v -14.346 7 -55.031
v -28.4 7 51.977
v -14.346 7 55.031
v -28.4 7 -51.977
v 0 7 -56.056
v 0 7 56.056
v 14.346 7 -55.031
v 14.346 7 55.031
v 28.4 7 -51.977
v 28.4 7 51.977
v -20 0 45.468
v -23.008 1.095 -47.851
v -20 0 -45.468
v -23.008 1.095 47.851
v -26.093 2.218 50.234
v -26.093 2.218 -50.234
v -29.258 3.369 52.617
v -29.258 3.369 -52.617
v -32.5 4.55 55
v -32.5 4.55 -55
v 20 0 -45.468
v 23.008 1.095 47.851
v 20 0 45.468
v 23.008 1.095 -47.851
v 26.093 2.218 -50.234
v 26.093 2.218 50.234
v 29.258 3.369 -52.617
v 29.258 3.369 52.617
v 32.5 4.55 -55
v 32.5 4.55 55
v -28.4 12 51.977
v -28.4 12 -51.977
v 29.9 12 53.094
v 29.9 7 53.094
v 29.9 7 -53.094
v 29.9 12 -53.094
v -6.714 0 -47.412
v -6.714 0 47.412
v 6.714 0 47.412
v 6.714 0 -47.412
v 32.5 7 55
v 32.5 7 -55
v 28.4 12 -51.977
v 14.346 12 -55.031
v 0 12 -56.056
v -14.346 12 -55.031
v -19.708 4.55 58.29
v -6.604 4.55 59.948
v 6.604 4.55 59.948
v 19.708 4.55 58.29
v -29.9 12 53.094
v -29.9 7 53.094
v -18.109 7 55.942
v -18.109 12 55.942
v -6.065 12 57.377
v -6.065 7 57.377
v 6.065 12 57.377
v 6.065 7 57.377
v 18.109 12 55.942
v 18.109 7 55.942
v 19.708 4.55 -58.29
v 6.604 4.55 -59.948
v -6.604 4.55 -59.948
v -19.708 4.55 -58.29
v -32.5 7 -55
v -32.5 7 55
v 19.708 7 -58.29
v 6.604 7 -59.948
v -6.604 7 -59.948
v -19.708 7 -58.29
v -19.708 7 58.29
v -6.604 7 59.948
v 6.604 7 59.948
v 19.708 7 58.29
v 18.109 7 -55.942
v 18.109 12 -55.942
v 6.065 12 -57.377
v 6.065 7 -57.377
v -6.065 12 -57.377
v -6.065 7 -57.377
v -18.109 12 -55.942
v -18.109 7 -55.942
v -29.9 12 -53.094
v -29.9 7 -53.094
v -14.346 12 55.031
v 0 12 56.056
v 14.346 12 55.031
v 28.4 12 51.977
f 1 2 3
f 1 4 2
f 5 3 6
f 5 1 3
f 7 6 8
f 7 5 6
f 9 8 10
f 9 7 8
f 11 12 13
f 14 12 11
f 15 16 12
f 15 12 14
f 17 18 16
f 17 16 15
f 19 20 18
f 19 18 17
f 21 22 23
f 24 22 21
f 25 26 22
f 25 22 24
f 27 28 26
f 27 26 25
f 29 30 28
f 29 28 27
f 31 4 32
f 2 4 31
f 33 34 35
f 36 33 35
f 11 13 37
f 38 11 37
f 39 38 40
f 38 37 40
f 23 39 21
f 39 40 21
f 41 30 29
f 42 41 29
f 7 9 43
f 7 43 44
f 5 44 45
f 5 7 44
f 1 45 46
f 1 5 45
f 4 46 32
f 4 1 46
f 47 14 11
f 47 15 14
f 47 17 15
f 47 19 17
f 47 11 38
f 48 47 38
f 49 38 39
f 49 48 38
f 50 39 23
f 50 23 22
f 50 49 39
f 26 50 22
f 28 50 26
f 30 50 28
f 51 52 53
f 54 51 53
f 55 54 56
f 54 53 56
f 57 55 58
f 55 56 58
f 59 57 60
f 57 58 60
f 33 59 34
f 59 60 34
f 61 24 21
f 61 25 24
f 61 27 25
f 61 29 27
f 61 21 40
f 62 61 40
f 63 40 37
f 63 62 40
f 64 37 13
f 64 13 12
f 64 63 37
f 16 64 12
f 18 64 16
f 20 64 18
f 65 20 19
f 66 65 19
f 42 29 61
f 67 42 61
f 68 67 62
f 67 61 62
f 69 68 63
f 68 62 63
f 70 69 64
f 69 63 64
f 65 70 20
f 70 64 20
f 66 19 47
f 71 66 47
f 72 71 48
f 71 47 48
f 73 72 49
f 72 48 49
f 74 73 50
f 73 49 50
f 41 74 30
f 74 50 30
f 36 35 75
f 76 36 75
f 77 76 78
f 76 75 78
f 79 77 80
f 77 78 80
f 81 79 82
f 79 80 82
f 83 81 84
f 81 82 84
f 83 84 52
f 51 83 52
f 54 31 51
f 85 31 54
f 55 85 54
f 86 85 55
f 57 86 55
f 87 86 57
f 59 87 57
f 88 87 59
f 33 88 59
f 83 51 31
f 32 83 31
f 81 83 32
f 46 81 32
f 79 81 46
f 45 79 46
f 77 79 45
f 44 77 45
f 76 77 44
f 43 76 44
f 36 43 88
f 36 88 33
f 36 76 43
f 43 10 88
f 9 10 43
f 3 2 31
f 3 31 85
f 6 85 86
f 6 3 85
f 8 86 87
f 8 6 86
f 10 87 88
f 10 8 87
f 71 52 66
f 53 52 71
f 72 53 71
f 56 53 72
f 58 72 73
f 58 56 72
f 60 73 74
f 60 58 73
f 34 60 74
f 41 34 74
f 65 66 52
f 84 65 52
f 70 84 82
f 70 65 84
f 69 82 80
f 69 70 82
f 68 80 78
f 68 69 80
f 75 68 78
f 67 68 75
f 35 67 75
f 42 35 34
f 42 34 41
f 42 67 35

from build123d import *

# Parameters (mm, degrees)
BOSS_EXTRUDE1_DEPTH = 7
BOSS_EXTRUDE2_DEPTH = 5
CHAMFER1_SIZE       = 12.5
CHAMFER1_SIZE2      = 4.549627928


with BuildPart() as part:
    # Sketch1 → Boss-Extrude1 (new body)
    with BuildSketch(Plane(origin=(0, 0, 0), x_dir=(1, 0, 0), z_dir=(0, 1, 0))):
        with BuildLine():
            Line((-32.5, 55), (-32.5, -55))
            ThreePointArc((-32.5, -55), (0, -60.156372261), (32.5, -55))
            Line((32.5, -55), (32.5, 55))
            ThreePointArc((32.5, 55), (0, 60.156372261), (-32.5, 55))
        make_face()
    extrude(amount=BOSS_EXTRUDE1_DEPTH)

    # Sketch2 → Boss-Extrude2 (add)
    with BuildSketch(Plane(origin=(0, 7, 0), x_dir=(1, 0, 0), z_dir=(0, 1, 0))):
        with BuildLine():
            Line((29.9, -53.093852319), (29.9, 53.093852319))
            ThreePointArc((29.9, 53.093852319), (0, 57.556372261), (-29.9, 53.093852319))
            Line((-29.9, 53.093852319), (-29.9, -53.093852319))
            ThreePointArc((-29.9, -53.093852319), (0, -57.556372261), (29.9, -53.093852319))
        make_face()
        with BuildLine():
            Line((28.4, -51.977082856), (28.4, 51.977082856))
            ThreePointArc((28.4, 51.977082856), (0, 56.056372261), (-28.4, 51.977082856))
            Line((-28.4, 51.977082856), (-28.4, -51.977082856))
            ThreePointArc((-28.4, -51.977082856), (0, -56.056372261), (28.4, -51.977082856))
        make_face(mode=Mode.SUBTRACT)
    extrude(amount=BOSS_EXTRUDE2_DEPTH)

    # Chamfer1
    chamfer1_edges = [part.edges().sort_by_distance(p)[0] for p in [
        (-32.5, 0, 0),
        (0, 0, -60.156372261),
        (32.5, 0, 0),
        (0, 0, 60.156372261),
    ]]
    chamfer1_side = [part.faces().sort_by_distance(p)[0] for p in [
        (0, 0, 0),
    ]]
    chamfer(chamfer1_edges, length=CHAMFER1_SIZE, length2=CHAMFER1_SIZE2, reference=chamfer1_side[0])


solid = part.part
